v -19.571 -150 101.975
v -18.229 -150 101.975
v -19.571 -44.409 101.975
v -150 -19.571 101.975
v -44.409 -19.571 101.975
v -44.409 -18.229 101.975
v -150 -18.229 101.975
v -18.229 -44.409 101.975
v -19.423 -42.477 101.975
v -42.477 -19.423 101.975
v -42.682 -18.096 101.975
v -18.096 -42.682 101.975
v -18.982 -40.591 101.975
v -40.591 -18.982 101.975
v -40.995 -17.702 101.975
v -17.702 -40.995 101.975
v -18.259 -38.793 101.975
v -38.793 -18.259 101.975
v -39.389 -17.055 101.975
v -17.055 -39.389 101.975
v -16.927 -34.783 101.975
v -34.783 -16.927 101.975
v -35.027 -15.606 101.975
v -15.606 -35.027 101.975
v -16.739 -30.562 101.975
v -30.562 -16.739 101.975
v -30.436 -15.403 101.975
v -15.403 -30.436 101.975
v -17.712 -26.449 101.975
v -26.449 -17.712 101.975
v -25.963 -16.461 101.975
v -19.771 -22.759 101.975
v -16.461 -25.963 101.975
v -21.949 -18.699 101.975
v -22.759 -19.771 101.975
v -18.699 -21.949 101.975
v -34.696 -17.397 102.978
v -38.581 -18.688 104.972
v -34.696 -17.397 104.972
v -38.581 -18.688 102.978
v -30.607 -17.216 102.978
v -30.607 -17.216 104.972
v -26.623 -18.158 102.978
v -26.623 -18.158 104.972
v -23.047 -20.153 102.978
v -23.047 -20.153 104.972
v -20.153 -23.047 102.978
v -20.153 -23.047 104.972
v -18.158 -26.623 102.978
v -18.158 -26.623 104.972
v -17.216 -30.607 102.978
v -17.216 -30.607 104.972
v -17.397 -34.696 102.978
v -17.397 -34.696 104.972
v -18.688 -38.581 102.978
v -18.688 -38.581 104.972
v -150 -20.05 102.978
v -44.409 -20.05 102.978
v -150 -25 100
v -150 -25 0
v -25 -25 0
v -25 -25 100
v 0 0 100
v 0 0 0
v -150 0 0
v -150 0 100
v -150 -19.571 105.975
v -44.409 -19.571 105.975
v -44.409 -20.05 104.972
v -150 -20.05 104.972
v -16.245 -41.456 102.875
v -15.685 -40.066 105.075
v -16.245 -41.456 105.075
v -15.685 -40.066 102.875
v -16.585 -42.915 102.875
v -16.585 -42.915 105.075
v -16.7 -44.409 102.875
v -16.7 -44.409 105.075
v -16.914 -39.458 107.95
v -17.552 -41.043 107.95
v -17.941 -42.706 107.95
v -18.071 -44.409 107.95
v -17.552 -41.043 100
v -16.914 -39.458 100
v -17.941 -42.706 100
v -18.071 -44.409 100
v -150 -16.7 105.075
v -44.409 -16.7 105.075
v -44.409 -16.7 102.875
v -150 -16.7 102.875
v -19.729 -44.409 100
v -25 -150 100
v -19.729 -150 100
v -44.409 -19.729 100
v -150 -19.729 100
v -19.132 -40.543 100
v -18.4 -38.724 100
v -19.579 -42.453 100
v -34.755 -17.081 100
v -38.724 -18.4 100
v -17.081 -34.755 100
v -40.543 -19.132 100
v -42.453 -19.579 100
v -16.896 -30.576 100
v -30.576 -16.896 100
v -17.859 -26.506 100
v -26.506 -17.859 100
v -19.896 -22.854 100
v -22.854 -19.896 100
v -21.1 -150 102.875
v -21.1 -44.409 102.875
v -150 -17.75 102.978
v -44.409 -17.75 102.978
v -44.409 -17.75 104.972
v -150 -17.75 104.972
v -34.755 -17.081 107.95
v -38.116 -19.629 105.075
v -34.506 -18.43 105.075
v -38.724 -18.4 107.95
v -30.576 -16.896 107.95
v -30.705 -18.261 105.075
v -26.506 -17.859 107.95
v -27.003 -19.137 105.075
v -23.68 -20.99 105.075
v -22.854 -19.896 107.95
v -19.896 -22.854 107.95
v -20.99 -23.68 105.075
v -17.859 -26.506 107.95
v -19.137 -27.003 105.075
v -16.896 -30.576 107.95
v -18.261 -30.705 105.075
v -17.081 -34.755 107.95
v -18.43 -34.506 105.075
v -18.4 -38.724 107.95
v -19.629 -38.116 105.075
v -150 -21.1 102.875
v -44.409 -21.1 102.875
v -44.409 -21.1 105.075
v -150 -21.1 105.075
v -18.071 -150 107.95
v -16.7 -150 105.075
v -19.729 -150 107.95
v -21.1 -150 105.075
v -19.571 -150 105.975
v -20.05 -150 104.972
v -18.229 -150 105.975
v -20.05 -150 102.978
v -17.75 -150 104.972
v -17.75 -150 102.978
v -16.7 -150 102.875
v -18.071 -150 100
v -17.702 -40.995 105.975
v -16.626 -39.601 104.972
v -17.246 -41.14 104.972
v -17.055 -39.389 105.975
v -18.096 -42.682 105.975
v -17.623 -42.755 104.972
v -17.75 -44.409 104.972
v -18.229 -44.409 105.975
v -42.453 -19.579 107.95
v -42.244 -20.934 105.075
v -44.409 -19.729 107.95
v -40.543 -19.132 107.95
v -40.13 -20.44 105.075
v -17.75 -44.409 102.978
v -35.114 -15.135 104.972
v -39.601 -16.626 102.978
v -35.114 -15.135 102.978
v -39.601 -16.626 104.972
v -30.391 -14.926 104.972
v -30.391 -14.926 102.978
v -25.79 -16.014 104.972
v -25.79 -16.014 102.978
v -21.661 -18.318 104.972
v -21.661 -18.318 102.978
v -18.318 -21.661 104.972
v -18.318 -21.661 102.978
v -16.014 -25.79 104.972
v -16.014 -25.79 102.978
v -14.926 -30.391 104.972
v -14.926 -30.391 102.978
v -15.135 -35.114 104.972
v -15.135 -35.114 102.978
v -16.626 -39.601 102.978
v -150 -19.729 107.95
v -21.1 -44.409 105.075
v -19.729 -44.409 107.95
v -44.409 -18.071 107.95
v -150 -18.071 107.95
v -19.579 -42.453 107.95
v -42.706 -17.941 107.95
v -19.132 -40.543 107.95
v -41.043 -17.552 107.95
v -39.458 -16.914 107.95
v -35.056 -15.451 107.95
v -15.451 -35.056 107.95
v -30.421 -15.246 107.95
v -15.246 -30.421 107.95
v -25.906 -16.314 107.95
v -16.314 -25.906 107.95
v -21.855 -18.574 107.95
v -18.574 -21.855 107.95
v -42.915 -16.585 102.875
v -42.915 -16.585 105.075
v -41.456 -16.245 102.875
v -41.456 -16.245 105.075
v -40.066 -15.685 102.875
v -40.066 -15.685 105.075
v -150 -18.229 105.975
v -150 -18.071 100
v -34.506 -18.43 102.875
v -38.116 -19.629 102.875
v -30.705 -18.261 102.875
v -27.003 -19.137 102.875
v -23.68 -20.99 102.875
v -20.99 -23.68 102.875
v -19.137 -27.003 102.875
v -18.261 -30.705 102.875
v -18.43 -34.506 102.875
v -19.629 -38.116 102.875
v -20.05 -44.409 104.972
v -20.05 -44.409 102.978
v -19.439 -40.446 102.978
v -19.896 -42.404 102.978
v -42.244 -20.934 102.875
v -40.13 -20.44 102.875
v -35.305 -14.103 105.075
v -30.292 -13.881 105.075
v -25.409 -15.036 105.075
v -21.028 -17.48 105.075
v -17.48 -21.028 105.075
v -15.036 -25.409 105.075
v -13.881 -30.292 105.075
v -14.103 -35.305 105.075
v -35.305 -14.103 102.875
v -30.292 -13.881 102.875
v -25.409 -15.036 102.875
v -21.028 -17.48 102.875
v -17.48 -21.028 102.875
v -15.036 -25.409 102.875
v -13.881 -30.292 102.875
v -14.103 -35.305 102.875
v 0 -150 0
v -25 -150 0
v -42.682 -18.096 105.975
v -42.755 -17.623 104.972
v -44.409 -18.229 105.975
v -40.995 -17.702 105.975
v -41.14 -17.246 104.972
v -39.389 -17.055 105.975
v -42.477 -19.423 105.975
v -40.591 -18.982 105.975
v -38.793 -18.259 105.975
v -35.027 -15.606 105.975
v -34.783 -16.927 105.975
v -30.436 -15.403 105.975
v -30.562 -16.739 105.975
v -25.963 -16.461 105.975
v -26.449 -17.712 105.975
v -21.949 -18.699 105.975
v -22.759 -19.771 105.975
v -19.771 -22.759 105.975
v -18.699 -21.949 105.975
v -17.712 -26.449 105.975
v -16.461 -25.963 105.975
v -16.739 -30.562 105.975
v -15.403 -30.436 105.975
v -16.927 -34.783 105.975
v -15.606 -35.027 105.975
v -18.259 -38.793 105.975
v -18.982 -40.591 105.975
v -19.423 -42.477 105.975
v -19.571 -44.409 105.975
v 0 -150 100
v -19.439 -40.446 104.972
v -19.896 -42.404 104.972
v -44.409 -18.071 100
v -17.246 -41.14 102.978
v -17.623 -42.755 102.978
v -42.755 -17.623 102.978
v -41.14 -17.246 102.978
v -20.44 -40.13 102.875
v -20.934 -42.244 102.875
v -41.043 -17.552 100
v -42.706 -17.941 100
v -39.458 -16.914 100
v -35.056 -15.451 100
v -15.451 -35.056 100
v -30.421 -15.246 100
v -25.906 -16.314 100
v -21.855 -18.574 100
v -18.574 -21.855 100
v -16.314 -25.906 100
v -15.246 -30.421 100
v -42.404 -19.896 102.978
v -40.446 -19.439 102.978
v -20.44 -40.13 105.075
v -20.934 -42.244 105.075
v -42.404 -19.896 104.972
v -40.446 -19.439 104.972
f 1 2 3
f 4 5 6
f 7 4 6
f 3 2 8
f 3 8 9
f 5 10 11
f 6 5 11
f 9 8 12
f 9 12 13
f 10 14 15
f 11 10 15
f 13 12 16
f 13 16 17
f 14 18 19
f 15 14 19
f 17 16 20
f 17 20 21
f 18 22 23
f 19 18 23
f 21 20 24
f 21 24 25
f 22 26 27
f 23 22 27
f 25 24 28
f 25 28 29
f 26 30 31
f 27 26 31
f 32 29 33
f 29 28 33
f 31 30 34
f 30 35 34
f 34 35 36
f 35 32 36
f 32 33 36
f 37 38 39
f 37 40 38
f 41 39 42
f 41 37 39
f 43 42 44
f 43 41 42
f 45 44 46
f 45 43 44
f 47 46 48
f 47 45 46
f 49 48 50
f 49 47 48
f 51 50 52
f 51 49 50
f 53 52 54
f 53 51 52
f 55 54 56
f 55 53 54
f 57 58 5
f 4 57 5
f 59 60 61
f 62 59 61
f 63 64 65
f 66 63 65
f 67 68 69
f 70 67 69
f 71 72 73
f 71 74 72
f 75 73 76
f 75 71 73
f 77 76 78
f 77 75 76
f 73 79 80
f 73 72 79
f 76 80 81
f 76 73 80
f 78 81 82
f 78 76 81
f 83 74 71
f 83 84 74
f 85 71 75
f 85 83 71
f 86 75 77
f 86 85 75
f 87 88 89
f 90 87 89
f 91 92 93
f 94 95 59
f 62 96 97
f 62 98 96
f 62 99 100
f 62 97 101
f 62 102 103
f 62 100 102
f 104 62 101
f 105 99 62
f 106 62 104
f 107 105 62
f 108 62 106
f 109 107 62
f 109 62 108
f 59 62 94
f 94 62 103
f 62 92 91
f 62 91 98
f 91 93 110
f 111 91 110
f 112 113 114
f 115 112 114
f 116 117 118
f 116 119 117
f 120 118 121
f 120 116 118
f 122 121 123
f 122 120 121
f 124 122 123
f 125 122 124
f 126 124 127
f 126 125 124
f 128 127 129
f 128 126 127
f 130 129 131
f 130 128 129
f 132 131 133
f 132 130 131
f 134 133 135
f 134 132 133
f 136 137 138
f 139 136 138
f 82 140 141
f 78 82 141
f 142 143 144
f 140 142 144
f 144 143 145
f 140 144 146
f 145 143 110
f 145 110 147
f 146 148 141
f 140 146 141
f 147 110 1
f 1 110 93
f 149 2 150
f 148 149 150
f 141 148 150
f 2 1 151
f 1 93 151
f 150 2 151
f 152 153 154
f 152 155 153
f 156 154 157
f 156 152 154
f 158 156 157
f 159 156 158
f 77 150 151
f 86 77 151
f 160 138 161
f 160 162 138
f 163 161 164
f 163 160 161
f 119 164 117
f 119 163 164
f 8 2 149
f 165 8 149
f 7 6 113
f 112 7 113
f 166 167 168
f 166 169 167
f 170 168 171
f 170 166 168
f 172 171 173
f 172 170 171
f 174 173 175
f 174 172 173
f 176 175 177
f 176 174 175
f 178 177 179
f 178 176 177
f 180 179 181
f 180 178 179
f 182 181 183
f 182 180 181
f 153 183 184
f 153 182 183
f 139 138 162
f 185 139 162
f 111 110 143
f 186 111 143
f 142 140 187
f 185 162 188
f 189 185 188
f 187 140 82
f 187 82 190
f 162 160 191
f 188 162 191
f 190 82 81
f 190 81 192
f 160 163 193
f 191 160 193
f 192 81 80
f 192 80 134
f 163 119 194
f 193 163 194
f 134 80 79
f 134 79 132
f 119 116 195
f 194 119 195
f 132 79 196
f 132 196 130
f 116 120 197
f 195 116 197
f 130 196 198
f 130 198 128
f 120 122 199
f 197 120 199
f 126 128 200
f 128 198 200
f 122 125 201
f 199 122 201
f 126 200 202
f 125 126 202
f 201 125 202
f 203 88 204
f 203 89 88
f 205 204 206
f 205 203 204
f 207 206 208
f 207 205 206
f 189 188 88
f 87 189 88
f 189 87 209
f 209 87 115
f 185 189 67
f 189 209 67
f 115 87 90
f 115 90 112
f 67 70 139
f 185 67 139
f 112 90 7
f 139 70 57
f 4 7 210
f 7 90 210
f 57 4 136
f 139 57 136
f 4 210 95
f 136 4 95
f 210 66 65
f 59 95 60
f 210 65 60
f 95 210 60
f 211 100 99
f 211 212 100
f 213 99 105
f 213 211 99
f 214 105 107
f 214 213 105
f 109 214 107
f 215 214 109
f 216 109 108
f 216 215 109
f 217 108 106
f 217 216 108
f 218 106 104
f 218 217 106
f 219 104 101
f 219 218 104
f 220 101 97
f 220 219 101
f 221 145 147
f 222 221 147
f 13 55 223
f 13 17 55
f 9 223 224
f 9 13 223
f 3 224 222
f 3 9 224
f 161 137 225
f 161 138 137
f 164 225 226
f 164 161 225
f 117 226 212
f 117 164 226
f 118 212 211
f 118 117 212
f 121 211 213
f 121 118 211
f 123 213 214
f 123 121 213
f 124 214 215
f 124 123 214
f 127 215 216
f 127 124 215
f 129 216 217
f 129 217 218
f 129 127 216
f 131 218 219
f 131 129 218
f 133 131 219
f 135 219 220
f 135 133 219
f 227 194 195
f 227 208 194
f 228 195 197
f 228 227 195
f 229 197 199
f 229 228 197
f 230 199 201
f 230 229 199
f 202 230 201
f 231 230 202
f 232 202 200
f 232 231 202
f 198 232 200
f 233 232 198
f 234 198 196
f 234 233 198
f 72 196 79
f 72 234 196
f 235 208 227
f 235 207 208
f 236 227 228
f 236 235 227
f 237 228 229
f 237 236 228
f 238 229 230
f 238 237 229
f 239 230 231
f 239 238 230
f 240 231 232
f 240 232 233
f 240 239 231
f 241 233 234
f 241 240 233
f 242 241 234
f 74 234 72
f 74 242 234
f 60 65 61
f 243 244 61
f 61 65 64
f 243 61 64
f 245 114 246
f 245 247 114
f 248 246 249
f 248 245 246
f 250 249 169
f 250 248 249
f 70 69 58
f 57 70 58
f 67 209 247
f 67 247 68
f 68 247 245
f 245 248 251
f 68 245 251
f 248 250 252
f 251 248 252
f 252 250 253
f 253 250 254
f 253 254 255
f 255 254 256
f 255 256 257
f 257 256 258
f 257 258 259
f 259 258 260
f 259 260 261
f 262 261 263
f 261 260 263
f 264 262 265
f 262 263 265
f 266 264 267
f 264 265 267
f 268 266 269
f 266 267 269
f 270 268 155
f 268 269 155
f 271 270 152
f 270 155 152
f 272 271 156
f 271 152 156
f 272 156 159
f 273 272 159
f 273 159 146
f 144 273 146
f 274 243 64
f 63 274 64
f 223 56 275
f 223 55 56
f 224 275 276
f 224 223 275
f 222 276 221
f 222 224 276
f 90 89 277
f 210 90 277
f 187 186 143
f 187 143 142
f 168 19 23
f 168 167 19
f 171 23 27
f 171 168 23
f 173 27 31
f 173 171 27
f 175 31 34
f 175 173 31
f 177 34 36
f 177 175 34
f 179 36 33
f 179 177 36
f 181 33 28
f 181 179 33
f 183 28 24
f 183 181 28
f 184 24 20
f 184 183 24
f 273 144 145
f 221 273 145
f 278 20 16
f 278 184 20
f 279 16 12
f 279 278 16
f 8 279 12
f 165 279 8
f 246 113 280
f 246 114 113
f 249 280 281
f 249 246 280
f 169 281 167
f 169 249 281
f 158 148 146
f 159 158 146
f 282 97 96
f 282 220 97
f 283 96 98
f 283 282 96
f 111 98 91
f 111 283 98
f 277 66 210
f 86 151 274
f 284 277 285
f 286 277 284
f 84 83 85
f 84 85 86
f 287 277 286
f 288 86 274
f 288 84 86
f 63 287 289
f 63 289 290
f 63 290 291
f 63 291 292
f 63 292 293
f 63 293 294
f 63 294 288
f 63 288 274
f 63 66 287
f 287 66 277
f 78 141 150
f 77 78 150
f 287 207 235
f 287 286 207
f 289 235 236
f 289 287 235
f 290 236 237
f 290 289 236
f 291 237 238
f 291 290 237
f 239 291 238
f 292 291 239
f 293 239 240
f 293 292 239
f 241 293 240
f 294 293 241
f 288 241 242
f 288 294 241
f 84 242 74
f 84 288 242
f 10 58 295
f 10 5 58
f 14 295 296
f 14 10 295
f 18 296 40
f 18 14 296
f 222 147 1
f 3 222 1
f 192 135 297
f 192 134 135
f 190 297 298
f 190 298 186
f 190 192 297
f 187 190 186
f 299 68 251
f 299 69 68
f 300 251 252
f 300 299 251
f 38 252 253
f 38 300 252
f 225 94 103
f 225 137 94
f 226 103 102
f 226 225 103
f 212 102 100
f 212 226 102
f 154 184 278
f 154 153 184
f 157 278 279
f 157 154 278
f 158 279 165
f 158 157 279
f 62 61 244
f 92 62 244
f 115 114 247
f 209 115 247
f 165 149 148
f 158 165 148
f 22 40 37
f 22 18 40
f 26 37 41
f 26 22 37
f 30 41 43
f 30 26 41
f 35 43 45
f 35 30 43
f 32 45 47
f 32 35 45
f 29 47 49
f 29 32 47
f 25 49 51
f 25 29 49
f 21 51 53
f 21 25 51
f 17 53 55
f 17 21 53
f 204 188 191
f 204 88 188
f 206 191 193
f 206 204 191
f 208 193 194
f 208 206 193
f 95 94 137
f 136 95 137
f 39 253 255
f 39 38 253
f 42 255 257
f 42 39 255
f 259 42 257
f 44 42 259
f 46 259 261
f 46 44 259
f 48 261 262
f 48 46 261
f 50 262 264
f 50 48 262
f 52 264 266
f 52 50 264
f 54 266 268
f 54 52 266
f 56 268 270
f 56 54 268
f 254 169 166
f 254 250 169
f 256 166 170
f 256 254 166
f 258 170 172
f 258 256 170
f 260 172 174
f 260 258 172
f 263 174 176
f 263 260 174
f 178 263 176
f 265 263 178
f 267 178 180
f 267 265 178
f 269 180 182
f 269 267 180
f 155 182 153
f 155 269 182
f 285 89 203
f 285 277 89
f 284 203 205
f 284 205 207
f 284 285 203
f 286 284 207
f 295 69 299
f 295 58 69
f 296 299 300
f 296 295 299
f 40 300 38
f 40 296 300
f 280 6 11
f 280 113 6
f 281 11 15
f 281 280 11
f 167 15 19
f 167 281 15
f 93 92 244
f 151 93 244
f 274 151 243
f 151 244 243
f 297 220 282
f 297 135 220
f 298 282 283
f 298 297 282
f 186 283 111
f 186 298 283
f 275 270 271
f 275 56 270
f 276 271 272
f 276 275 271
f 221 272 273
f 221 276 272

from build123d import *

# Parameters (mm, degrees)
F1_DEPTH = 100


with BuildPart() as f1:
    # F0 (on Top) → F1 (new body)
    with BuildSketch(Plane.XY):
        Polygon((0, -150), (0, 0), (-150, 0), (-150, -25), (-25, -25), (-25, -150), align=None)
    extrude(amount=F1_DEPTH)

    # F4: sweep along a path in F2
    with BuildLine(Plane.XY.offset(100)) as f4_path:
        Line((-150, -18.9), (-44.4089054678, -18.9))
        ThreePointArc((-44.4089054678, -18.9), (-41.6782966505, -18.5851947133), (-39.0909561818, -17.6572959145))
        ThreePointArc((-39.0909561818, -17.6572959145), (-20.6866486348, -20.6866486348), (-17.6572959145, -39.0909561818))
        ThreePointArc((-17.6572959145, -39.0909561818), (-18.5851947133, -41.6782966505), (-18.9, -44.4089054678))
        Line((-18.9, -44.4089054678), (-18.9, -150))
    # F3 (on face) → F4 (sweep)
    with BuildSketch(Plane(origin=(-150, 0, 0), x_dir=(0, -1, 0), z_dir=(-1, 0, 0))):
        Polygon((16.7, 102.875), (18.0713046565, 100), (19.7286953435, 100), (21.1, 102.875), (21.1, 105.075), (19.7286953435, 107.95), (18.0713046565, 107.95), (16.7, 105.075), align=None)
        Polygon((17.75, 104.971631851), (18.2285820574, 105.975), (19.5714179426, 105.975), (20.05, 104.971631851), (20.05, 102.978368149), (19.5714179426, 101.975), (18.2285820574, 101.975), (17.75, 102.978368149), align=None, mode=Mode.SUBTRACT)
    sweep(path=f4_path.line)


solid = f1.part
